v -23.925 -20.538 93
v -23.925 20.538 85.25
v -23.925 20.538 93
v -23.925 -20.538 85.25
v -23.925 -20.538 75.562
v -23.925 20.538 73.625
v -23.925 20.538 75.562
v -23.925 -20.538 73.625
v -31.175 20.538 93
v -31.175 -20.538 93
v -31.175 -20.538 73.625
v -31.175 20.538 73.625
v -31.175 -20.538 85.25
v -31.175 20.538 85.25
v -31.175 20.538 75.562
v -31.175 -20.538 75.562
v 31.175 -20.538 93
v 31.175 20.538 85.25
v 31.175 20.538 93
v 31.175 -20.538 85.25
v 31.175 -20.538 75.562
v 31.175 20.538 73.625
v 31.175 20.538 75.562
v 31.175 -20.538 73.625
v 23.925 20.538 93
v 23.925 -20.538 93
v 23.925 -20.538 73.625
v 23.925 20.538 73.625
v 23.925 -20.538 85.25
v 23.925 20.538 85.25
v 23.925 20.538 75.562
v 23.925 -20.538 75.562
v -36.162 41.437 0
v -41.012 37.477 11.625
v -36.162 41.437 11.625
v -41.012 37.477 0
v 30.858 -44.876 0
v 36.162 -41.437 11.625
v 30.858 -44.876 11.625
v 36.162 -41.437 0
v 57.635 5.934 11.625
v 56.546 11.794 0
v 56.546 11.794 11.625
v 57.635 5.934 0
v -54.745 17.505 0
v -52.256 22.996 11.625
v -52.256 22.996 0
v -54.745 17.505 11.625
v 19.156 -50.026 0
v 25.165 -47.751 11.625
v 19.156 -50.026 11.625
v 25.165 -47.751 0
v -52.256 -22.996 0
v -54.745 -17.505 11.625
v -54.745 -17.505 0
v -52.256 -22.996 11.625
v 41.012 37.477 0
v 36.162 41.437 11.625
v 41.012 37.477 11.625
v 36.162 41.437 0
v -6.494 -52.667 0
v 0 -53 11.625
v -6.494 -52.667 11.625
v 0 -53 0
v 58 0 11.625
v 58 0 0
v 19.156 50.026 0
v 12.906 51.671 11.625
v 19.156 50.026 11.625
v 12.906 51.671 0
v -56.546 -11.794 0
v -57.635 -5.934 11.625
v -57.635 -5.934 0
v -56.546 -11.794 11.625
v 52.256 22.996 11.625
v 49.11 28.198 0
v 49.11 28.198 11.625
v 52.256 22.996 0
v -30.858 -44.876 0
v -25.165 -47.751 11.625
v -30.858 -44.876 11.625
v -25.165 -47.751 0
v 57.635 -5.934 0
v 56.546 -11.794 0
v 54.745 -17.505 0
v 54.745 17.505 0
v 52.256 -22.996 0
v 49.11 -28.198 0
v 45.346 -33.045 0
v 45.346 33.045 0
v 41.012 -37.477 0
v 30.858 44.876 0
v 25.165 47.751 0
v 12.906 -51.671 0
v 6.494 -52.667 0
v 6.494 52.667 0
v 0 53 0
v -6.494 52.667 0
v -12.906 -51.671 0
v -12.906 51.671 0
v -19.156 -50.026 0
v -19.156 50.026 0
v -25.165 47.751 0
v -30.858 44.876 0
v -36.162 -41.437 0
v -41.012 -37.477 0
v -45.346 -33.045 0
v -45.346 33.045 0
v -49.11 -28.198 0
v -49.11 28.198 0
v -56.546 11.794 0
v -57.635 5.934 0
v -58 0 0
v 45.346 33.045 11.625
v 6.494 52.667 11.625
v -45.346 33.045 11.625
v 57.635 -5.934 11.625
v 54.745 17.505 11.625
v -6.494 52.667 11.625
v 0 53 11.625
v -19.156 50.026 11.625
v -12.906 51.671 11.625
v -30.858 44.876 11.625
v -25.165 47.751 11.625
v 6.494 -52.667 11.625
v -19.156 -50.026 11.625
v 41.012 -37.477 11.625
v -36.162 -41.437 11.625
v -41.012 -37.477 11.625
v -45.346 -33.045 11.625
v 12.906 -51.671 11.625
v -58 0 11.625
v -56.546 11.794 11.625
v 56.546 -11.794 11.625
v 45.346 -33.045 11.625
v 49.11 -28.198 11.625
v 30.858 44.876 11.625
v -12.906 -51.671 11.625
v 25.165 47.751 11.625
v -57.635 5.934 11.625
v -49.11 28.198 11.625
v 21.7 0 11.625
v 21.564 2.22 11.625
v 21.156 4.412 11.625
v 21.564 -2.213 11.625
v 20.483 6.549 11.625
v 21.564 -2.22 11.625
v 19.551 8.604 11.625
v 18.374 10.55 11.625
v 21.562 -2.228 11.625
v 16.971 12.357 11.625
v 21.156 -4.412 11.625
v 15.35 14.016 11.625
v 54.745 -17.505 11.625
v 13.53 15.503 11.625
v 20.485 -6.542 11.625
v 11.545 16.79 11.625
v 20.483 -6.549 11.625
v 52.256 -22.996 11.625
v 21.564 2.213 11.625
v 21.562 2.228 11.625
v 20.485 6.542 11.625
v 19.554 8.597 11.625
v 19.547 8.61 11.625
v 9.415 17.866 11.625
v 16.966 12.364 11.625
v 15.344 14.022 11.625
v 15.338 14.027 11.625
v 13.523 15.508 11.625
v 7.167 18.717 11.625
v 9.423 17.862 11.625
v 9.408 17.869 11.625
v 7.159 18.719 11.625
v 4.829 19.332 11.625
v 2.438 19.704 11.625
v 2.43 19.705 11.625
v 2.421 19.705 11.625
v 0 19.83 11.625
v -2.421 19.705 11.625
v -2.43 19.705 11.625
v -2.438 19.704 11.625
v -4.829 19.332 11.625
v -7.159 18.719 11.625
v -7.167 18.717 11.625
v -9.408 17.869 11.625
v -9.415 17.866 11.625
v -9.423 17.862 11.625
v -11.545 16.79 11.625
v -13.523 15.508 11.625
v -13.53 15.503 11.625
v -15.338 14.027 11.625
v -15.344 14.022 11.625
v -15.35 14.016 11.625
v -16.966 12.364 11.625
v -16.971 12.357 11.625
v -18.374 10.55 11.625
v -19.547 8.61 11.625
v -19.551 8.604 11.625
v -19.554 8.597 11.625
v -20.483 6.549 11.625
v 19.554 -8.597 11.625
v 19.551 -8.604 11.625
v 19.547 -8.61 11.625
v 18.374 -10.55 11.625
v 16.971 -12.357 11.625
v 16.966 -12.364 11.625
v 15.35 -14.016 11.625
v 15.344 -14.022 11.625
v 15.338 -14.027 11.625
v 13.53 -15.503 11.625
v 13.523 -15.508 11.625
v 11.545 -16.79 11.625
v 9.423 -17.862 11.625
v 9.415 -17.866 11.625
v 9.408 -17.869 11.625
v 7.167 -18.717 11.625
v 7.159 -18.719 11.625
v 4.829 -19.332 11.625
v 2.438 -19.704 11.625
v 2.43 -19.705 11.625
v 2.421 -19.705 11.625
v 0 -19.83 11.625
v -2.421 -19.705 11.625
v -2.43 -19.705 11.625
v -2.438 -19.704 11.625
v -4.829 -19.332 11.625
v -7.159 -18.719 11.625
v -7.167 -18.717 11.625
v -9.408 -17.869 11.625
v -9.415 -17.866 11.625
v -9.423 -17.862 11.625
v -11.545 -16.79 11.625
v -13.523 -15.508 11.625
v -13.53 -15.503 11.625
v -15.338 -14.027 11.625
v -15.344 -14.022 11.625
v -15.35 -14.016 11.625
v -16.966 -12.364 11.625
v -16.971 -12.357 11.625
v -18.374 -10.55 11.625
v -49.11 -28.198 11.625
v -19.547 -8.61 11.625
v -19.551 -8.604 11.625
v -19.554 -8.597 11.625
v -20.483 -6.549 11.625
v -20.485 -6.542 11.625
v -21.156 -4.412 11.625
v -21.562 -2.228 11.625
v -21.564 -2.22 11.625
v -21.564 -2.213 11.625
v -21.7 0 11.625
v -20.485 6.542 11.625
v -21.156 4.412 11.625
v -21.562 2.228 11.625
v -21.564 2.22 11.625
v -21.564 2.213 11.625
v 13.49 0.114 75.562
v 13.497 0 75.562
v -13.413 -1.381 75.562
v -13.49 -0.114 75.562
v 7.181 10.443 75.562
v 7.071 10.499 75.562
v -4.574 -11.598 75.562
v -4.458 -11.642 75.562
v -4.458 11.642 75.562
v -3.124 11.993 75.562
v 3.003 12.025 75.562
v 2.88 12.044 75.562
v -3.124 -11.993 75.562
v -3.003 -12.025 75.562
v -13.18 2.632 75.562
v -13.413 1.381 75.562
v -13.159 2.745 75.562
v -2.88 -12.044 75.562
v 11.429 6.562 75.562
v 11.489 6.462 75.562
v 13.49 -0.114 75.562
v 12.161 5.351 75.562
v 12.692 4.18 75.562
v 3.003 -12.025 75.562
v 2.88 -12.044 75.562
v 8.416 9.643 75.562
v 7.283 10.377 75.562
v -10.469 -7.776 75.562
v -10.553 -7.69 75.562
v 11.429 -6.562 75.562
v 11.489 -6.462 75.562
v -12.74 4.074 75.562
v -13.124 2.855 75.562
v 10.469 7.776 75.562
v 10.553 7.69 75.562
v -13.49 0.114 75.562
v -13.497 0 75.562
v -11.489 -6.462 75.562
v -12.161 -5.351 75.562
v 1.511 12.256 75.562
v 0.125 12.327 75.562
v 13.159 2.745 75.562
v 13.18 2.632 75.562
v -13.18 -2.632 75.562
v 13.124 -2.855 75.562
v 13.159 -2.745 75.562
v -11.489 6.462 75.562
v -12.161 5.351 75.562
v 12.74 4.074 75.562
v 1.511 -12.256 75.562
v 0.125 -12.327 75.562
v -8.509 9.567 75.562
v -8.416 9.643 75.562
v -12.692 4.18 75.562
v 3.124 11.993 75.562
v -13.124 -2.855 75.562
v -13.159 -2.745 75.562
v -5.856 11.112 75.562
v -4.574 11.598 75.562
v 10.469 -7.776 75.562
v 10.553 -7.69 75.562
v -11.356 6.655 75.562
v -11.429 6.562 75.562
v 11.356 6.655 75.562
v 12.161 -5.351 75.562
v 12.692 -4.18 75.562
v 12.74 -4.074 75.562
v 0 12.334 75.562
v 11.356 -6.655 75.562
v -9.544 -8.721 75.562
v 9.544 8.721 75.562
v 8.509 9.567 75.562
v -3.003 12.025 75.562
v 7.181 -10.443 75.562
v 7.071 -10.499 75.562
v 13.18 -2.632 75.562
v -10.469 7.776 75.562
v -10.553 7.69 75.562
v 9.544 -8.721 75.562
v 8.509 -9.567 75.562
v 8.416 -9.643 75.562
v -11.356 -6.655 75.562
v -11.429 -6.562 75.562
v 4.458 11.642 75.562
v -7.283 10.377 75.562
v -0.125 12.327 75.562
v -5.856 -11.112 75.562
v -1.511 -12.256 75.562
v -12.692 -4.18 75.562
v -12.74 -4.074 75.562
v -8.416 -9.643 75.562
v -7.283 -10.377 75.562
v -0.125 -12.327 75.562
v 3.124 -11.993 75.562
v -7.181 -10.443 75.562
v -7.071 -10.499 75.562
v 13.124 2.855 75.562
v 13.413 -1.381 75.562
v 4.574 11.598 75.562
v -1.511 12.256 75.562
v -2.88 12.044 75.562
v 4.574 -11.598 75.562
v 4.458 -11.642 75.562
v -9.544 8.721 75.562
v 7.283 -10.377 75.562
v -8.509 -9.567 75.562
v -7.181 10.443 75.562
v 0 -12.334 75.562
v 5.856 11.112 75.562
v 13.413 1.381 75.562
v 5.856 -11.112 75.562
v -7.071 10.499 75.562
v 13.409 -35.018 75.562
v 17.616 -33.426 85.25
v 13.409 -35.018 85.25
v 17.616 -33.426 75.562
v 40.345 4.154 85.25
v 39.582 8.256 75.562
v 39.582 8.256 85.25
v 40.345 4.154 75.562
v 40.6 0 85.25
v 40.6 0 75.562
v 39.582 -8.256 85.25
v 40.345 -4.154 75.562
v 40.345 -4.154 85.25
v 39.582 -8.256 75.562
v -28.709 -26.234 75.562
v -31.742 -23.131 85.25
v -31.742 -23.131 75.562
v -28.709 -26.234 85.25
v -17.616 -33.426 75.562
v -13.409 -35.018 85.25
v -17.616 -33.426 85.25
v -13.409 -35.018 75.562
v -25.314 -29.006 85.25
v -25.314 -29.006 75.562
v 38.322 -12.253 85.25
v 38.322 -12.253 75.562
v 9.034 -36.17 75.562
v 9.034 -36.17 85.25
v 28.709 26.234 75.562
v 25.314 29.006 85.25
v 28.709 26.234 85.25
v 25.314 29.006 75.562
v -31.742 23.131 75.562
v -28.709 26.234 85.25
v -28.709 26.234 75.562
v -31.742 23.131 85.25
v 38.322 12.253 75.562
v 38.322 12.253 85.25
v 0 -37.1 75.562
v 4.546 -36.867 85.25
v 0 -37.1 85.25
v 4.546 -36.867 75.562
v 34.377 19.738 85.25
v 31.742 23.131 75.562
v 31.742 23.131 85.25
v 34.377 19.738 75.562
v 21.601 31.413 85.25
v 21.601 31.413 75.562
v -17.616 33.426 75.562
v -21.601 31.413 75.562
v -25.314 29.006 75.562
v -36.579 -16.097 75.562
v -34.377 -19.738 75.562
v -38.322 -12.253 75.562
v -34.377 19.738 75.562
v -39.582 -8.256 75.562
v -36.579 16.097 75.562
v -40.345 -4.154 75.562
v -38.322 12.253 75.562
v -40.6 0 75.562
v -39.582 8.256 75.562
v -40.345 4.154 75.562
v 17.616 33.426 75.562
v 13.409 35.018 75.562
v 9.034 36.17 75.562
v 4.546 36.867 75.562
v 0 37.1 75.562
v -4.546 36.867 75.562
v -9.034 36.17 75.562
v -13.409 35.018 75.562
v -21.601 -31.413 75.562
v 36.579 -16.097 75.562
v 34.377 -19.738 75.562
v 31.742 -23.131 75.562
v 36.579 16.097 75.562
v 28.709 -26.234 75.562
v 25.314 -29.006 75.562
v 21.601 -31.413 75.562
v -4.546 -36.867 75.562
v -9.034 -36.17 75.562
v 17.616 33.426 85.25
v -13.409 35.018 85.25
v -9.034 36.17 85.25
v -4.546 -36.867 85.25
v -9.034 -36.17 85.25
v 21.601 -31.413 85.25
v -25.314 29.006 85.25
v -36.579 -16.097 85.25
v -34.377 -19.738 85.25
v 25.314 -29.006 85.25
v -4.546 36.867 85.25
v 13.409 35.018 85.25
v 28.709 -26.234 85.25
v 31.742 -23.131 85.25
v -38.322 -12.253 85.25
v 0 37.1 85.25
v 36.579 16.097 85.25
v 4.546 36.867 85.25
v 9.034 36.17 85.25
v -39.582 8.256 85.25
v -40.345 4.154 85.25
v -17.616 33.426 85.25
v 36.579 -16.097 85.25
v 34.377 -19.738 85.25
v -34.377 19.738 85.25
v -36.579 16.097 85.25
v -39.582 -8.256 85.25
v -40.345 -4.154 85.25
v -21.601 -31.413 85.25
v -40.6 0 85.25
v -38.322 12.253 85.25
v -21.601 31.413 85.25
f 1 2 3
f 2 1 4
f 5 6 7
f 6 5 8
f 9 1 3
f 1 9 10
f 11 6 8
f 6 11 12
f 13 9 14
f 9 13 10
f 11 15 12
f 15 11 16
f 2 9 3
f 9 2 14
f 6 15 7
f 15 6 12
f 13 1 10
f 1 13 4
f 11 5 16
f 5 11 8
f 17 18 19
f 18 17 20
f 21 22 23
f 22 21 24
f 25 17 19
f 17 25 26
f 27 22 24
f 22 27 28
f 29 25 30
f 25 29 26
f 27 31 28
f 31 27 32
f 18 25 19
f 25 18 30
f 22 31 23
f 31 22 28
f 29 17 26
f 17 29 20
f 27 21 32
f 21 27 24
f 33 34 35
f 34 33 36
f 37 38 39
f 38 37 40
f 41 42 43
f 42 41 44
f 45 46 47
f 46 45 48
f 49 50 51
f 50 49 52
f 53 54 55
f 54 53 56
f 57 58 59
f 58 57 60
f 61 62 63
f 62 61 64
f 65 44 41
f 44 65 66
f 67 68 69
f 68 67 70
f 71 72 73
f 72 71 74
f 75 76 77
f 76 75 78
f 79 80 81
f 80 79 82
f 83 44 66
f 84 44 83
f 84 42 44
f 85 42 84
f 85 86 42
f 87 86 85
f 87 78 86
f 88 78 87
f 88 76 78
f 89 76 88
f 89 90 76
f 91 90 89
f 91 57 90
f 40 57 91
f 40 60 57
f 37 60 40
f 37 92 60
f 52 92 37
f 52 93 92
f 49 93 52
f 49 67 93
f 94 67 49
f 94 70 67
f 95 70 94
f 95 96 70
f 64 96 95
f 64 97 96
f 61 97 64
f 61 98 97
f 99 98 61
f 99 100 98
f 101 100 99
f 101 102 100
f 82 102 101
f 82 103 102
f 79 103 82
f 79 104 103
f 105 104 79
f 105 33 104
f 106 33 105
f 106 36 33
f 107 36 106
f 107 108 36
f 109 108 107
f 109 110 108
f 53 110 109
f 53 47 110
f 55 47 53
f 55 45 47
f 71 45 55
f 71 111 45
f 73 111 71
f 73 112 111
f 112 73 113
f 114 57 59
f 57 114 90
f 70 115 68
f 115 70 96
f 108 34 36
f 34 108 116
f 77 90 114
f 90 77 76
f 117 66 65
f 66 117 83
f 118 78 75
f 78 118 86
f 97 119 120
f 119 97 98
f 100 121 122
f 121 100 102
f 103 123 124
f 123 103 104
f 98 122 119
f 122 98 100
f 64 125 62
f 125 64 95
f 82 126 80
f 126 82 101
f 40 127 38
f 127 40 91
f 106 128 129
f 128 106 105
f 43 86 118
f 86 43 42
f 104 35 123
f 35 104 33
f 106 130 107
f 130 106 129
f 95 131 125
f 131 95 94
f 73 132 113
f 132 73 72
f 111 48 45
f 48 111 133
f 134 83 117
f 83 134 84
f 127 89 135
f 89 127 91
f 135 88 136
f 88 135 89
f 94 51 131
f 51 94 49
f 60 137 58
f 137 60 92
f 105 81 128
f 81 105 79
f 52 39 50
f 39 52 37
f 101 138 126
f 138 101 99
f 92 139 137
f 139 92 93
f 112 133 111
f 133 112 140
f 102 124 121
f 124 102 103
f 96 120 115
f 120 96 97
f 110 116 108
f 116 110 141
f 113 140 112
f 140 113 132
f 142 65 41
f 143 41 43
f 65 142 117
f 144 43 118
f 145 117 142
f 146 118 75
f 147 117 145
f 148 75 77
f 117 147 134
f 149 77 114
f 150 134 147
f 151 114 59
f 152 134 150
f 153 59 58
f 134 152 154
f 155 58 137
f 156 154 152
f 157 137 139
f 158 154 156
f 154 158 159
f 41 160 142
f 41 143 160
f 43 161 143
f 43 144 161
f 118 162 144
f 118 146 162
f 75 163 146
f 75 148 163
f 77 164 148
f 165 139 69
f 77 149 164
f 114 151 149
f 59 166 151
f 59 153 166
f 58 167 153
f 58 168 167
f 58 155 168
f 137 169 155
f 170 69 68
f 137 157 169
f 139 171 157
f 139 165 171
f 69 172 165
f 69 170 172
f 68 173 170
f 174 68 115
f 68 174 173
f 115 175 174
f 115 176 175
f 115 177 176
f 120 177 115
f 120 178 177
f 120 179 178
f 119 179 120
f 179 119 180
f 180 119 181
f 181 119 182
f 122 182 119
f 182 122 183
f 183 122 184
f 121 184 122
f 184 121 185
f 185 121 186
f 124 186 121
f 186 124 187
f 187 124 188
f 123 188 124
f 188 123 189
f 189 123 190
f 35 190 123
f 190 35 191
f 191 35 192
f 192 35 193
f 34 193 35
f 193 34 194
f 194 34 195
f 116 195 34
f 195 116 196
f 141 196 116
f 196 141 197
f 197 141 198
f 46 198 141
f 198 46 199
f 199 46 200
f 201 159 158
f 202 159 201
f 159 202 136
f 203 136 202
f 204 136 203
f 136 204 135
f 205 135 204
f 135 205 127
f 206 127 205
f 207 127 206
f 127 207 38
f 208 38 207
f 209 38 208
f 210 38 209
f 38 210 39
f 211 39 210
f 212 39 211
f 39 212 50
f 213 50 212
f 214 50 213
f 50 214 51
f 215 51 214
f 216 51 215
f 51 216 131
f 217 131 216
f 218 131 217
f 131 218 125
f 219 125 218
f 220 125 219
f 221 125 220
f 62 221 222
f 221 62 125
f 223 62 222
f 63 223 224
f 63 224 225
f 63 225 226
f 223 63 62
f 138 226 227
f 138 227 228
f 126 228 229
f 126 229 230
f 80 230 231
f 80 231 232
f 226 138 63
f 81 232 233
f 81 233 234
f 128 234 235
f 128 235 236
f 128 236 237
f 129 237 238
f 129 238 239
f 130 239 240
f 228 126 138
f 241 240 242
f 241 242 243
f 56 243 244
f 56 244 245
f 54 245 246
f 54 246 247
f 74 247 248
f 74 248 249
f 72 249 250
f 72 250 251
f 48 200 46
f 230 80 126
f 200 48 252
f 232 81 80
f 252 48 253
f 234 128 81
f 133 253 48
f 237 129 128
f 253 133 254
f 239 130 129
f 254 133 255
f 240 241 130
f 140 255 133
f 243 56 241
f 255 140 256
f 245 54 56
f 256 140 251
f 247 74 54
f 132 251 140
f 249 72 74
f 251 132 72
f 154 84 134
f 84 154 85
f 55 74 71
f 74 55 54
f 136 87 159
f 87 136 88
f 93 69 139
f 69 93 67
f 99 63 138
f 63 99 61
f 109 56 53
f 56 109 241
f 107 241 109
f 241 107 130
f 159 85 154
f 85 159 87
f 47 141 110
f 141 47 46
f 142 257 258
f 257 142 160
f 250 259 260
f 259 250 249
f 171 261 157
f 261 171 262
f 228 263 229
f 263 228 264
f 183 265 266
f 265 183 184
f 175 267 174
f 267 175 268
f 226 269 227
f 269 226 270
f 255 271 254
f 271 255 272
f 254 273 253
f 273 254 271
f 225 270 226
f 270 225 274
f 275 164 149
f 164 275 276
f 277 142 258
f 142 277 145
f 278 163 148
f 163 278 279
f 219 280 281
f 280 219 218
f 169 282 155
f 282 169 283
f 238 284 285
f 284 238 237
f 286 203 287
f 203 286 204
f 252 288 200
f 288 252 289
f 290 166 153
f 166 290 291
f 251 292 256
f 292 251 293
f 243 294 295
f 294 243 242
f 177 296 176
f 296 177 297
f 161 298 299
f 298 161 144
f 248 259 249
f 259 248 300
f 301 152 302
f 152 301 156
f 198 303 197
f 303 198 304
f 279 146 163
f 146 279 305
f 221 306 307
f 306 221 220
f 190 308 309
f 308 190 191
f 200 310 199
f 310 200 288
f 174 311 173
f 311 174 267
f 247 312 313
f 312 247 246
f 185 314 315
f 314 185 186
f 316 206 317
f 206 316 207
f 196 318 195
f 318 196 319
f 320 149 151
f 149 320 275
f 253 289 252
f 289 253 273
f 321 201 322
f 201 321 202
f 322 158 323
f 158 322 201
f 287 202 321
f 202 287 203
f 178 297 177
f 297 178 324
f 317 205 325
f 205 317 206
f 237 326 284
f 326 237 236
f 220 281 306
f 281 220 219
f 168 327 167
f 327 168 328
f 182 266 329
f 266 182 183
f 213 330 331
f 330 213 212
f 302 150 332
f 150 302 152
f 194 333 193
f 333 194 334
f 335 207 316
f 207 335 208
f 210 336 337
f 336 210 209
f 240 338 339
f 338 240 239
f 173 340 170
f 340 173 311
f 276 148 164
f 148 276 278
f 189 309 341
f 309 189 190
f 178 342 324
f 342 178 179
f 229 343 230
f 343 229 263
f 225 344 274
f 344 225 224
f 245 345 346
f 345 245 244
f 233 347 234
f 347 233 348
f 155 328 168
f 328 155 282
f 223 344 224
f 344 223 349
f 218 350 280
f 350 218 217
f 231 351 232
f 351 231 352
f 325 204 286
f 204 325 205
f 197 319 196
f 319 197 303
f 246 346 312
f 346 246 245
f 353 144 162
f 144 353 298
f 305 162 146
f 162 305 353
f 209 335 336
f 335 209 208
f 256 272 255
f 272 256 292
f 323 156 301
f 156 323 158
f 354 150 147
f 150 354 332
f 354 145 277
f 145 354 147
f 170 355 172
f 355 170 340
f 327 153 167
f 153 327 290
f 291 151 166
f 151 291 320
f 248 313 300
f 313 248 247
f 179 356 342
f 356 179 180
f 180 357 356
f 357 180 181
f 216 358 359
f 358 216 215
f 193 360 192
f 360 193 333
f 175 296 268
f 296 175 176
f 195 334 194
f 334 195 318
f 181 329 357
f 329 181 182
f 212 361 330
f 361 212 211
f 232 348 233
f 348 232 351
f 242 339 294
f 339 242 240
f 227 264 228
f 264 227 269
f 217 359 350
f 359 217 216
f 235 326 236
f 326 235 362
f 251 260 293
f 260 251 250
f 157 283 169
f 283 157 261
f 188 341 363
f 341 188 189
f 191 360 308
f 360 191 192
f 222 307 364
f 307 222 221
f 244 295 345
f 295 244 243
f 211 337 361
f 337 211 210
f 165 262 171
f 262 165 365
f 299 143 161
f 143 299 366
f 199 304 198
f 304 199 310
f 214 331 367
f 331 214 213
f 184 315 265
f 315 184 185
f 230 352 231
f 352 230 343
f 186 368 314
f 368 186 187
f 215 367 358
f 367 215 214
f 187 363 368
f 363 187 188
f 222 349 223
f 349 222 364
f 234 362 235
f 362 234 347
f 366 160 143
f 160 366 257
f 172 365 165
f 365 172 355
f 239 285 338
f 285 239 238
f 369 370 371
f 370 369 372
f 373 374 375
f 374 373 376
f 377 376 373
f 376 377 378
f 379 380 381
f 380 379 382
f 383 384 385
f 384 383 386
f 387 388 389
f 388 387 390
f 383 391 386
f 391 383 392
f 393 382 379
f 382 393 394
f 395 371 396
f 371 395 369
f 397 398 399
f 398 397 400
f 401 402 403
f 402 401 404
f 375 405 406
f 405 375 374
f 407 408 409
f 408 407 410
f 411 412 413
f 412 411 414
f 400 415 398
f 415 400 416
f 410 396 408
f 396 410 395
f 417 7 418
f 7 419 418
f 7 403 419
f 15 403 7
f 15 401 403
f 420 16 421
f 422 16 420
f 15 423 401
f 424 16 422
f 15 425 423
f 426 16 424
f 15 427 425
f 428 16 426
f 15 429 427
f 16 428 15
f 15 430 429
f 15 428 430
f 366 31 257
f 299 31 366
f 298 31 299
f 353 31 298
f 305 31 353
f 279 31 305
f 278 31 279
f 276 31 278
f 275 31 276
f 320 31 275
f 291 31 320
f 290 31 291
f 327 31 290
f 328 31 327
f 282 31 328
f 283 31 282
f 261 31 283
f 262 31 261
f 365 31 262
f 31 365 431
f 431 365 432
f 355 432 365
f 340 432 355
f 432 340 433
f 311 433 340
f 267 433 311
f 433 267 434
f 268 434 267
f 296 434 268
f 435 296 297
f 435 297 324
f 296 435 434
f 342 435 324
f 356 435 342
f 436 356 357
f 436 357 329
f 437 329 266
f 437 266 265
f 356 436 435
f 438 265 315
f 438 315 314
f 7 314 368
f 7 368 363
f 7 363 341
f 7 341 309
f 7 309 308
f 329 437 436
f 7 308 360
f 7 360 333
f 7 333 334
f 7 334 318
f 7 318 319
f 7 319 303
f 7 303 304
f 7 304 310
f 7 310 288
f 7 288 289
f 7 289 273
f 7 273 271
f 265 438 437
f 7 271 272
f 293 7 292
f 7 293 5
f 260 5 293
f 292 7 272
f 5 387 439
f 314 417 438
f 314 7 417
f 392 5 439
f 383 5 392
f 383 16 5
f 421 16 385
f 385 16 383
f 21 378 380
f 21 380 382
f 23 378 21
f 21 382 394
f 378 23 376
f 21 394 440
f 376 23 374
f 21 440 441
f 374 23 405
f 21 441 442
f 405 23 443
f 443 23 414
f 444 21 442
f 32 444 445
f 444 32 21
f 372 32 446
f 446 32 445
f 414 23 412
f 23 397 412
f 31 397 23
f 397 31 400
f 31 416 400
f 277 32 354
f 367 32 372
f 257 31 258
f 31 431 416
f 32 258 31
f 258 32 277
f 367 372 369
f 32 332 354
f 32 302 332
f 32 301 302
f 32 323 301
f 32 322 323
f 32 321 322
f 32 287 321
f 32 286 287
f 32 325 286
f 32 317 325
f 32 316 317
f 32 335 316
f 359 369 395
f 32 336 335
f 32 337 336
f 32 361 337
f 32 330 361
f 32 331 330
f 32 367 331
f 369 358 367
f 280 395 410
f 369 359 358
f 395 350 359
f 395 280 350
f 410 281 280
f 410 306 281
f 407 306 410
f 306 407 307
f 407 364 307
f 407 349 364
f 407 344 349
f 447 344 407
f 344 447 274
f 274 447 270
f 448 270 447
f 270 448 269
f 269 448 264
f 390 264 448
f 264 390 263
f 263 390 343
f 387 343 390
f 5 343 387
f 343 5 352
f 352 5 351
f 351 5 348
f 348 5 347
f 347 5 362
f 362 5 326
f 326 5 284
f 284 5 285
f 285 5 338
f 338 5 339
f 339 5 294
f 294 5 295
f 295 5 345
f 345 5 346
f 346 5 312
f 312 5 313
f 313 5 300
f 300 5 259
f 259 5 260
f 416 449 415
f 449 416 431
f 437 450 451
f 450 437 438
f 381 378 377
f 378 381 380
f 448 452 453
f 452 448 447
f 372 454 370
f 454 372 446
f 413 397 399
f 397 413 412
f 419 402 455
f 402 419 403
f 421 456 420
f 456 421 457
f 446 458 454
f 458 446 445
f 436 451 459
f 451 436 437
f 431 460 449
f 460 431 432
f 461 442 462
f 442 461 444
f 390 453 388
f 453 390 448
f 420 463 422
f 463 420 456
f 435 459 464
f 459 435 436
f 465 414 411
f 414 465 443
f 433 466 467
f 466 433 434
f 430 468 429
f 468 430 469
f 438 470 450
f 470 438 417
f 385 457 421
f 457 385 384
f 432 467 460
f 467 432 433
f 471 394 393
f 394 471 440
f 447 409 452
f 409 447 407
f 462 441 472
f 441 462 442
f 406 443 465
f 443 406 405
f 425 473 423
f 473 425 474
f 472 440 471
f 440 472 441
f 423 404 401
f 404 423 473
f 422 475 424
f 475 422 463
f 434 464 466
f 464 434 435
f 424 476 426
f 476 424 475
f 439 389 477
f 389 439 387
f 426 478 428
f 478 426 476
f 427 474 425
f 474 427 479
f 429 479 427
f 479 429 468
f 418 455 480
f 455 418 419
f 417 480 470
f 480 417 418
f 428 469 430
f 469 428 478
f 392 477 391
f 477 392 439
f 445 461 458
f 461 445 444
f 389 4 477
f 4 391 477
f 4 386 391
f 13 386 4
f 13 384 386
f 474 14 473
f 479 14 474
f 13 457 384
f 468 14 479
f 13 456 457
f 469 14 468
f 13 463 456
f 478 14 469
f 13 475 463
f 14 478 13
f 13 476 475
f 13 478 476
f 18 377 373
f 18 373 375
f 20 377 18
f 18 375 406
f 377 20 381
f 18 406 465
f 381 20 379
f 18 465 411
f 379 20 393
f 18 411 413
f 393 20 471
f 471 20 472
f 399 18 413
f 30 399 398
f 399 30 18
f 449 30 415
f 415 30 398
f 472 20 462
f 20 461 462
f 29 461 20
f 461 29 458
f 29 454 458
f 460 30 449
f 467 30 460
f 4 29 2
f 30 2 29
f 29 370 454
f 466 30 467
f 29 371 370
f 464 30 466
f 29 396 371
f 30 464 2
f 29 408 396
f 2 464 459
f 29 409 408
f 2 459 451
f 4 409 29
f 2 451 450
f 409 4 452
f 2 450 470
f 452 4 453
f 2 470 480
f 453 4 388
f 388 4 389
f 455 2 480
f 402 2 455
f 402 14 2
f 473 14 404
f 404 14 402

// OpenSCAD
// Trading Card Display | 收藏卡片展示架 | original parametric CAD prototype
// CAD uses millimeters/Z-up; target dimensions [width,depth,height] mm.
// Product hypothesis only; full slicer/manifold and real-print checks required.
use <lib/commerce_forms.scad>
resize([116,106,93],auto=false)
    commercial_form(family="display",variant=3);
